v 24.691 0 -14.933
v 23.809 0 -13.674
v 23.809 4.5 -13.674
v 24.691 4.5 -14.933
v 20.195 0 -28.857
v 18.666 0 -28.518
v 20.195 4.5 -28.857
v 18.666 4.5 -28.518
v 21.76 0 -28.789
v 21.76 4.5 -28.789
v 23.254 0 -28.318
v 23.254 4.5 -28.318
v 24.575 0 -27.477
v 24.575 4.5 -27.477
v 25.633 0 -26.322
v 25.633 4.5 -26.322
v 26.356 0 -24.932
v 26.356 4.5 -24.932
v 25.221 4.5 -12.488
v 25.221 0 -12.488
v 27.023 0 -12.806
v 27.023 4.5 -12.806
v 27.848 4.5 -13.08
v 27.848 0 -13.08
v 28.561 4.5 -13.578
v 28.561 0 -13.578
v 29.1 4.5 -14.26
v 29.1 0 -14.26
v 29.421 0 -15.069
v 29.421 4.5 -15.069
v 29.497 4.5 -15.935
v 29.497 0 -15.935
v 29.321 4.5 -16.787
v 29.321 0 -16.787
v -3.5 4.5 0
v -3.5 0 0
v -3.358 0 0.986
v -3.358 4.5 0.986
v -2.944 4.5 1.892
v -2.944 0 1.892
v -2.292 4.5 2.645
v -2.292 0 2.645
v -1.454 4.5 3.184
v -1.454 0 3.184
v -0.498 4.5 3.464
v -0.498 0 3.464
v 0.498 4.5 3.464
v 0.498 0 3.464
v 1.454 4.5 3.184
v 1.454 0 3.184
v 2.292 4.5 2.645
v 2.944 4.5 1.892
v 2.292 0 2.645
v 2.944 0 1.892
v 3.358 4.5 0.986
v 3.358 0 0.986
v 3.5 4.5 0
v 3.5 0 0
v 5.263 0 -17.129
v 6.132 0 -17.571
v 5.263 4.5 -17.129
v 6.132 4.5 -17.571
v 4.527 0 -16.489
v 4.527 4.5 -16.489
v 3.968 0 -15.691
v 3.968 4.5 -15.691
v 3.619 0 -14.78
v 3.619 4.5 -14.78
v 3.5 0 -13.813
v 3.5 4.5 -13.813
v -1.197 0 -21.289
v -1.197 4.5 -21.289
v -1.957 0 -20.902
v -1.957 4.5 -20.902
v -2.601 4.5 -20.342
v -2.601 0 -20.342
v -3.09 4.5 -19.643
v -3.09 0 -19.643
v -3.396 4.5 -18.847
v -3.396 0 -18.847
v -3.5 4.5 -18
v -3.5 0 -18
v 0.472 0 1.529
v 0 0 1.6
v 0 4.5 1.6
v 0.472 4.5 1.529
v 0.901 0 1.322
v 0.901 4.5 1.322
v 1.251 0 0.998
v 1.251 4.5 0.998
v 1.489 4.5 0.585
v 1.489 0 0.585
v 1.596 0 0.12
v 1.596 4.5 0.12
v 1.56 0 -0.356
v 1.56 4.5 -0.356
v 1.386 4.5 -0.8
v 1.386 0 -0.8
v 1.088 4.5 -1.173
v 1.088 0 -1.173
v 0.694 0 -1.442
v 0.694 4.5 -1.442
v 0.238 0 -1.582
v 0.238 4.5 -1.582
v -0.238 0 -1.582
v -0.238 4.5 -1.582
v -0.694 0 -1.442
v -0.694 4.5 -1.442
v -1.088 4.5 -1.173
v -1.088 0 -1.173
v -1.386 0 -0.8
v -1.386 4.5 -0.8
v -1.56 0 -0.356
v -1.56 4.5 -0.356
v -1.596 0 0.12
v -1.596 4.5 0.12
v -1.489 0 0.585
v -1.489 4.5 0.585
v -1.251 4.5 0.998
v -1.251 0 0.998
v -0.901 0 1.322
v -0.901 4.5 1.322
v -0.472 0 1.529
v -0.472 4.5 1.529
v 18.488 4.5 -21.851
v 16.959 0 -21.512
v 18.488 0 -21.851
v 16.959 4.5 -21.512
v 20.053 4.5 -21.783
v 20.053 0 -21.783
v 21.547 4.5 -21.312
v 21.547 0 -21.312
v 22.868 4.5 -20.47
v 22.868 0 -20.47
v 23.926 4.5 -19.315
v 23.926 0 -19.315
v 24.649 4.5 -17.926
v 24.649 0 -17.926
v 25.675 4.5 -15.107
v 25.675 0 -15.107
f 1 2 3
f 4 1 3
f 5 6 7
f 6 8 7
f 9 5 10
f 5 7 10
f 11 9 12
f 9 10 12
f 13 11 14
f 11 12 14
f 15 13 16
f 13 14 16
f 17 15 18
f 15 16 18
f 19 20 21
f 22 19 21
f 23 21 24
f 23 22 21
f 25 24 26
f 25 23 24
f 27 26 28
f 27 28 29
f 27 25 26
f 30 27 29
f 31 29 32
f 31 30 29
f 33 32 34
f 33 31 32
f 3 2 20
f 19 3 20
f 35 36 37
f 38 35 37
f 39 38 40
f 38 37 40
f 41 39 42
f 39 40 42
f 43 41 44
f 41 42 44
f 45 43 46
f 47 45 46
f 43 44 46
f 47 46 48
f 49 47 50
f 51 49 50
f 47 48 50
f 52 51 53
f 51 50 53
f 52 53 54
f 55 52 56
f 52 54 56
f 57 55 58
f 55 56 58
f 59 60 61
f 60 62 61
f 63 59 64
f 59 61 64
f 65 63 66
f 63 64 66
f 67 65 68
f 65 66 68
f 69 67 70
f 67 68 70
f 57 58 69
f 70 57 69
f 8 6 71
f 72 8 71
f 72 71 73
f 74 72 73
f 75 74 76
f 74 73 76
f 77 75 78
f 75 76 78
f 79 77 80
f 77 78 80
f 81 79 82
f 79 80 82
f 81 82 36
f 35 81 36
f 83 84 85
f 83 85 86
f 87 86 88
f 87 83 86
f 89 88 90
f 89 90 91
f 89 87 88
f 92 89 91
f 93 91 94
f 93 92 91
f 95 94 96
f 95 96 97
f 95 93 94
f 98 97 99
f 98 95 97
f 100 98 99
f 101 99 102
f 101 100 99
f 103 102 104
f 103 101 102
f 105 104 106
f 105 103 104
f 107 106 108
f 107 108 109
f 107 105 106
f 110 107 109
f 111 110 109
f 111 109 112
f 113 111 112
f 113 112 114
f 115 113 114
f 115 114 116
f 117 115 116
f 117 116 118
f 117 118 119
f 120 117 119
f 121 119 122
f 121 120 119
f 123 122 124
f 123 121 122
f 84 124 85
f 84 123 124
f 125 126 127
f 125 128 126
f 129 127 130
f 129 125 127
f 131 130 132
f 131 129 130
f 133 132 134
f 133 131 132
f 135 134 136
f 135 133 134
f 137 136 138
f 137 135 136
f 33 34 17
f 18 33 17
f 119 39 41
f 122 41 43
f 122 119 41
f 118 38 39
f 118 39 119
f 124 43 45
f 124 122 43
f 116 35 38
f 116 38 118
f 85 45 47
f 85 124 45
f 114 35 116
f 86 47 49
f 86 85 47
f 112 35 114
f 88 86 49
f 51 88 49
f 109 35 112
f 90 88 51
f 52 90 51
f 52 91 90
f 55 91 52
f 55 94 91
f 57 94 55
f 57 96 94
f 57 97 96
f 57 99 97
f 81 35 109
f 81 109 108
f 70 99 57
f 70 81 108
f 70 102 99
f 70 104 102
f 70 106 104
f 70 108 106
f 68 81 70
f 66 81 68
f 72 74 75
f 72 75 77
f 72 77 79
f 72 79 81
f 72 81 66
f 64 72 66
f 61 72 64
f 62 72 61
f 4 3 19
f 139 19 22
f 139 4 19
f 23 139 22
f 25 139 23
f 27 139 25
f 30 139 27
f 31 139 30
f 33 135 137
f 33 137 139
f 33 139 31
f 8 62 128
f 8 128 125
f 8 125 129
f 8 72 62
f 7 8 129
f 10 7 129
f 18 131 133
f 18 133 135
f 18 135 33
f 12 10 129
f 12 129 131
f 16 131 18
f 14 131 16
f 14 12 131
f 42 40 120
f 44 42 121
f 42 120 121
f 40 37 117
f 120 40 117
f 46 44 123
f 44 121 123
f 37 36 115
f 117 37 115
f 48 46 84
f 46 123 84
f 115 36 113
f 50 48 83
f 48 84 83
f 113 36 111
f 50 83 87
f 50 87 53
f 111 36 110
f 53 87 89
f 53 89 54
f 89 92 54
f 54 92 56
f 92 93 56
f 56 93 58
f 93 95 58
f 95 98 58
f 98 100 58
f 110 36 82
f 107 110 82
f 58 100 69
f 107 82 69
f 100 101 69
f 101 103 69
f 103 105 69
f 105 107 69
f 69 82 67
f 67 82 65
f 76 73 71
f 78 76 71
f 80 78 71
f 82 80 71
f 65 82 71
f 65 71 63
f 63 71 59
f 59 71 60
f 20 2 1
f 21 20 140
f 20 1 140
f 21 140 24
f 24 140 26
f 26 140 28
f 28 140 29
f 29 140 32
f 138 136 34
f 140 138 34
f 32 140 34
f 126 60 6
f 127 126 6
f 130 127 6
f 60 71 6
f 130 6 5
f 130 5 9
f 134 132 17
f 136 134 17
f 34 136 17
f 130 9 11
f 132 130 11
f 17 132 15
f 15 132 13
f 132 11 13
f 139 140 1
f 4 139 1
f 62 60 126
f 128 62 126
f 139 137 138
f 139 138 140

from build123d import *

# Parameters (mm, degrees)
SKETCH1_R           = 1.6
BOSS_EXTRUDE1_DEPTH = 4.5
FILLET1_R           = 4
FILLET2_R           = 6
FILLET3_R           = 3
CHAMFER1_SIZE       = 2
CHAMFER1_SIZE2      = 1.419615628


with BuildPart() as part:
    # Sketch1 → Boss-Extrude1 (new body)
    # profile 1 of 2: a face of its own
    with BuildSketch(Plane(origin=(0, 0, 0), x_dir=(1, 0, 0), z_dir=(0, 1, 0))):
        with BuildLine():
            Line((3.5, 0), (3.5, 18))
            ThreePointArc((3.5, 18), (0, 21.5), (-3.5, 18))
            Line((-3.5, 18), (-3.5, 0))
            ThreePointArc((-3.5, 0), (0, -3.5), (3.5, 0))
        make_face()
        with Locations(Location((0, 0, 0), (0, 0, 270))):
            Circle(SKETCH1_R, mode=Mode.SUBTRACT)
    # profile 2 of 2: a face of its own
    with BuildSketch(Plane(origin=(0, 0, 0), x_dir=(1, 0, 0), z_dir=(0, 1, 0))):
        with BuildLine():
            Line((24.303924048, 30.570527133), (-1.197070502, 21.288924173))
            ThreePointArc((-1.197070502, 21.288924173), (2.007517527, 20.867032155), (3.5, 18))
            Line((3.5, 18), (3.5, 16.613451389))
            Line((3.5, 16.613451389), (22.597274425, 23.564290835))
            Line((22.597274425, 23.564290835), (25.675455715, 15.107057248))
            Line((25.675455715, 15.107057248), (22.721032456, 14.586112715))
            Line((22.721032456, 14.586112715), (25.221032456, 12.488363637))
            Line((25.221032456, 12.488363637), (30.543696603, 13.426892935))
            Line((30.543696603, 13.426892935), (24.303924048, 30.570527133))
        make_face()
    extrude(amount=BOSS_EXTRUDE1_DEPTH)

    # Fillet1
    fillet1_edges = [part.edges().sort_by_distance(p)[0] for p in [
        (3.5, 2.25, -16.613451389),
    ]]
    fillet(fillet1_edges, radius=FILLET1_R)

    # Fillet2
    fillet2_edges = [part.edges().sort_by_distance(p)[0] for p in [
        (24.303924048, 2.25, -30.570527133),
        (22.597274425, 2.25, -23.564290835),
    ]]
    fillet(fillet2_edges, radius=FILLET2_R)

    # Fillet3
    fillet3_edges = [part.edges().sort_by_distance(p)[0] for p in [
        (30.543696603, 2.25, -13.426892935),
    ]]
    fillet(fillet3_edges, radius=FILLET3_R)

    # Chamfer1
    chamfer1_edges = [part.edges().sort_by_distance(p)[0] for p in [
        (22.721032456, 2.25, -14.586112715),
    ]]
    chamfer1_side = [part.faces().sort_by_distance(p)[0] for p in [
        (24.198244085, 2.25, -14.846584982),
    ]]
    chamfer(chamfer1_edges, length=CHAMFER1_SIZE, length2=CHAMFER1_SIZE2, reference=chamfer1_side[0])


solid = part.part
